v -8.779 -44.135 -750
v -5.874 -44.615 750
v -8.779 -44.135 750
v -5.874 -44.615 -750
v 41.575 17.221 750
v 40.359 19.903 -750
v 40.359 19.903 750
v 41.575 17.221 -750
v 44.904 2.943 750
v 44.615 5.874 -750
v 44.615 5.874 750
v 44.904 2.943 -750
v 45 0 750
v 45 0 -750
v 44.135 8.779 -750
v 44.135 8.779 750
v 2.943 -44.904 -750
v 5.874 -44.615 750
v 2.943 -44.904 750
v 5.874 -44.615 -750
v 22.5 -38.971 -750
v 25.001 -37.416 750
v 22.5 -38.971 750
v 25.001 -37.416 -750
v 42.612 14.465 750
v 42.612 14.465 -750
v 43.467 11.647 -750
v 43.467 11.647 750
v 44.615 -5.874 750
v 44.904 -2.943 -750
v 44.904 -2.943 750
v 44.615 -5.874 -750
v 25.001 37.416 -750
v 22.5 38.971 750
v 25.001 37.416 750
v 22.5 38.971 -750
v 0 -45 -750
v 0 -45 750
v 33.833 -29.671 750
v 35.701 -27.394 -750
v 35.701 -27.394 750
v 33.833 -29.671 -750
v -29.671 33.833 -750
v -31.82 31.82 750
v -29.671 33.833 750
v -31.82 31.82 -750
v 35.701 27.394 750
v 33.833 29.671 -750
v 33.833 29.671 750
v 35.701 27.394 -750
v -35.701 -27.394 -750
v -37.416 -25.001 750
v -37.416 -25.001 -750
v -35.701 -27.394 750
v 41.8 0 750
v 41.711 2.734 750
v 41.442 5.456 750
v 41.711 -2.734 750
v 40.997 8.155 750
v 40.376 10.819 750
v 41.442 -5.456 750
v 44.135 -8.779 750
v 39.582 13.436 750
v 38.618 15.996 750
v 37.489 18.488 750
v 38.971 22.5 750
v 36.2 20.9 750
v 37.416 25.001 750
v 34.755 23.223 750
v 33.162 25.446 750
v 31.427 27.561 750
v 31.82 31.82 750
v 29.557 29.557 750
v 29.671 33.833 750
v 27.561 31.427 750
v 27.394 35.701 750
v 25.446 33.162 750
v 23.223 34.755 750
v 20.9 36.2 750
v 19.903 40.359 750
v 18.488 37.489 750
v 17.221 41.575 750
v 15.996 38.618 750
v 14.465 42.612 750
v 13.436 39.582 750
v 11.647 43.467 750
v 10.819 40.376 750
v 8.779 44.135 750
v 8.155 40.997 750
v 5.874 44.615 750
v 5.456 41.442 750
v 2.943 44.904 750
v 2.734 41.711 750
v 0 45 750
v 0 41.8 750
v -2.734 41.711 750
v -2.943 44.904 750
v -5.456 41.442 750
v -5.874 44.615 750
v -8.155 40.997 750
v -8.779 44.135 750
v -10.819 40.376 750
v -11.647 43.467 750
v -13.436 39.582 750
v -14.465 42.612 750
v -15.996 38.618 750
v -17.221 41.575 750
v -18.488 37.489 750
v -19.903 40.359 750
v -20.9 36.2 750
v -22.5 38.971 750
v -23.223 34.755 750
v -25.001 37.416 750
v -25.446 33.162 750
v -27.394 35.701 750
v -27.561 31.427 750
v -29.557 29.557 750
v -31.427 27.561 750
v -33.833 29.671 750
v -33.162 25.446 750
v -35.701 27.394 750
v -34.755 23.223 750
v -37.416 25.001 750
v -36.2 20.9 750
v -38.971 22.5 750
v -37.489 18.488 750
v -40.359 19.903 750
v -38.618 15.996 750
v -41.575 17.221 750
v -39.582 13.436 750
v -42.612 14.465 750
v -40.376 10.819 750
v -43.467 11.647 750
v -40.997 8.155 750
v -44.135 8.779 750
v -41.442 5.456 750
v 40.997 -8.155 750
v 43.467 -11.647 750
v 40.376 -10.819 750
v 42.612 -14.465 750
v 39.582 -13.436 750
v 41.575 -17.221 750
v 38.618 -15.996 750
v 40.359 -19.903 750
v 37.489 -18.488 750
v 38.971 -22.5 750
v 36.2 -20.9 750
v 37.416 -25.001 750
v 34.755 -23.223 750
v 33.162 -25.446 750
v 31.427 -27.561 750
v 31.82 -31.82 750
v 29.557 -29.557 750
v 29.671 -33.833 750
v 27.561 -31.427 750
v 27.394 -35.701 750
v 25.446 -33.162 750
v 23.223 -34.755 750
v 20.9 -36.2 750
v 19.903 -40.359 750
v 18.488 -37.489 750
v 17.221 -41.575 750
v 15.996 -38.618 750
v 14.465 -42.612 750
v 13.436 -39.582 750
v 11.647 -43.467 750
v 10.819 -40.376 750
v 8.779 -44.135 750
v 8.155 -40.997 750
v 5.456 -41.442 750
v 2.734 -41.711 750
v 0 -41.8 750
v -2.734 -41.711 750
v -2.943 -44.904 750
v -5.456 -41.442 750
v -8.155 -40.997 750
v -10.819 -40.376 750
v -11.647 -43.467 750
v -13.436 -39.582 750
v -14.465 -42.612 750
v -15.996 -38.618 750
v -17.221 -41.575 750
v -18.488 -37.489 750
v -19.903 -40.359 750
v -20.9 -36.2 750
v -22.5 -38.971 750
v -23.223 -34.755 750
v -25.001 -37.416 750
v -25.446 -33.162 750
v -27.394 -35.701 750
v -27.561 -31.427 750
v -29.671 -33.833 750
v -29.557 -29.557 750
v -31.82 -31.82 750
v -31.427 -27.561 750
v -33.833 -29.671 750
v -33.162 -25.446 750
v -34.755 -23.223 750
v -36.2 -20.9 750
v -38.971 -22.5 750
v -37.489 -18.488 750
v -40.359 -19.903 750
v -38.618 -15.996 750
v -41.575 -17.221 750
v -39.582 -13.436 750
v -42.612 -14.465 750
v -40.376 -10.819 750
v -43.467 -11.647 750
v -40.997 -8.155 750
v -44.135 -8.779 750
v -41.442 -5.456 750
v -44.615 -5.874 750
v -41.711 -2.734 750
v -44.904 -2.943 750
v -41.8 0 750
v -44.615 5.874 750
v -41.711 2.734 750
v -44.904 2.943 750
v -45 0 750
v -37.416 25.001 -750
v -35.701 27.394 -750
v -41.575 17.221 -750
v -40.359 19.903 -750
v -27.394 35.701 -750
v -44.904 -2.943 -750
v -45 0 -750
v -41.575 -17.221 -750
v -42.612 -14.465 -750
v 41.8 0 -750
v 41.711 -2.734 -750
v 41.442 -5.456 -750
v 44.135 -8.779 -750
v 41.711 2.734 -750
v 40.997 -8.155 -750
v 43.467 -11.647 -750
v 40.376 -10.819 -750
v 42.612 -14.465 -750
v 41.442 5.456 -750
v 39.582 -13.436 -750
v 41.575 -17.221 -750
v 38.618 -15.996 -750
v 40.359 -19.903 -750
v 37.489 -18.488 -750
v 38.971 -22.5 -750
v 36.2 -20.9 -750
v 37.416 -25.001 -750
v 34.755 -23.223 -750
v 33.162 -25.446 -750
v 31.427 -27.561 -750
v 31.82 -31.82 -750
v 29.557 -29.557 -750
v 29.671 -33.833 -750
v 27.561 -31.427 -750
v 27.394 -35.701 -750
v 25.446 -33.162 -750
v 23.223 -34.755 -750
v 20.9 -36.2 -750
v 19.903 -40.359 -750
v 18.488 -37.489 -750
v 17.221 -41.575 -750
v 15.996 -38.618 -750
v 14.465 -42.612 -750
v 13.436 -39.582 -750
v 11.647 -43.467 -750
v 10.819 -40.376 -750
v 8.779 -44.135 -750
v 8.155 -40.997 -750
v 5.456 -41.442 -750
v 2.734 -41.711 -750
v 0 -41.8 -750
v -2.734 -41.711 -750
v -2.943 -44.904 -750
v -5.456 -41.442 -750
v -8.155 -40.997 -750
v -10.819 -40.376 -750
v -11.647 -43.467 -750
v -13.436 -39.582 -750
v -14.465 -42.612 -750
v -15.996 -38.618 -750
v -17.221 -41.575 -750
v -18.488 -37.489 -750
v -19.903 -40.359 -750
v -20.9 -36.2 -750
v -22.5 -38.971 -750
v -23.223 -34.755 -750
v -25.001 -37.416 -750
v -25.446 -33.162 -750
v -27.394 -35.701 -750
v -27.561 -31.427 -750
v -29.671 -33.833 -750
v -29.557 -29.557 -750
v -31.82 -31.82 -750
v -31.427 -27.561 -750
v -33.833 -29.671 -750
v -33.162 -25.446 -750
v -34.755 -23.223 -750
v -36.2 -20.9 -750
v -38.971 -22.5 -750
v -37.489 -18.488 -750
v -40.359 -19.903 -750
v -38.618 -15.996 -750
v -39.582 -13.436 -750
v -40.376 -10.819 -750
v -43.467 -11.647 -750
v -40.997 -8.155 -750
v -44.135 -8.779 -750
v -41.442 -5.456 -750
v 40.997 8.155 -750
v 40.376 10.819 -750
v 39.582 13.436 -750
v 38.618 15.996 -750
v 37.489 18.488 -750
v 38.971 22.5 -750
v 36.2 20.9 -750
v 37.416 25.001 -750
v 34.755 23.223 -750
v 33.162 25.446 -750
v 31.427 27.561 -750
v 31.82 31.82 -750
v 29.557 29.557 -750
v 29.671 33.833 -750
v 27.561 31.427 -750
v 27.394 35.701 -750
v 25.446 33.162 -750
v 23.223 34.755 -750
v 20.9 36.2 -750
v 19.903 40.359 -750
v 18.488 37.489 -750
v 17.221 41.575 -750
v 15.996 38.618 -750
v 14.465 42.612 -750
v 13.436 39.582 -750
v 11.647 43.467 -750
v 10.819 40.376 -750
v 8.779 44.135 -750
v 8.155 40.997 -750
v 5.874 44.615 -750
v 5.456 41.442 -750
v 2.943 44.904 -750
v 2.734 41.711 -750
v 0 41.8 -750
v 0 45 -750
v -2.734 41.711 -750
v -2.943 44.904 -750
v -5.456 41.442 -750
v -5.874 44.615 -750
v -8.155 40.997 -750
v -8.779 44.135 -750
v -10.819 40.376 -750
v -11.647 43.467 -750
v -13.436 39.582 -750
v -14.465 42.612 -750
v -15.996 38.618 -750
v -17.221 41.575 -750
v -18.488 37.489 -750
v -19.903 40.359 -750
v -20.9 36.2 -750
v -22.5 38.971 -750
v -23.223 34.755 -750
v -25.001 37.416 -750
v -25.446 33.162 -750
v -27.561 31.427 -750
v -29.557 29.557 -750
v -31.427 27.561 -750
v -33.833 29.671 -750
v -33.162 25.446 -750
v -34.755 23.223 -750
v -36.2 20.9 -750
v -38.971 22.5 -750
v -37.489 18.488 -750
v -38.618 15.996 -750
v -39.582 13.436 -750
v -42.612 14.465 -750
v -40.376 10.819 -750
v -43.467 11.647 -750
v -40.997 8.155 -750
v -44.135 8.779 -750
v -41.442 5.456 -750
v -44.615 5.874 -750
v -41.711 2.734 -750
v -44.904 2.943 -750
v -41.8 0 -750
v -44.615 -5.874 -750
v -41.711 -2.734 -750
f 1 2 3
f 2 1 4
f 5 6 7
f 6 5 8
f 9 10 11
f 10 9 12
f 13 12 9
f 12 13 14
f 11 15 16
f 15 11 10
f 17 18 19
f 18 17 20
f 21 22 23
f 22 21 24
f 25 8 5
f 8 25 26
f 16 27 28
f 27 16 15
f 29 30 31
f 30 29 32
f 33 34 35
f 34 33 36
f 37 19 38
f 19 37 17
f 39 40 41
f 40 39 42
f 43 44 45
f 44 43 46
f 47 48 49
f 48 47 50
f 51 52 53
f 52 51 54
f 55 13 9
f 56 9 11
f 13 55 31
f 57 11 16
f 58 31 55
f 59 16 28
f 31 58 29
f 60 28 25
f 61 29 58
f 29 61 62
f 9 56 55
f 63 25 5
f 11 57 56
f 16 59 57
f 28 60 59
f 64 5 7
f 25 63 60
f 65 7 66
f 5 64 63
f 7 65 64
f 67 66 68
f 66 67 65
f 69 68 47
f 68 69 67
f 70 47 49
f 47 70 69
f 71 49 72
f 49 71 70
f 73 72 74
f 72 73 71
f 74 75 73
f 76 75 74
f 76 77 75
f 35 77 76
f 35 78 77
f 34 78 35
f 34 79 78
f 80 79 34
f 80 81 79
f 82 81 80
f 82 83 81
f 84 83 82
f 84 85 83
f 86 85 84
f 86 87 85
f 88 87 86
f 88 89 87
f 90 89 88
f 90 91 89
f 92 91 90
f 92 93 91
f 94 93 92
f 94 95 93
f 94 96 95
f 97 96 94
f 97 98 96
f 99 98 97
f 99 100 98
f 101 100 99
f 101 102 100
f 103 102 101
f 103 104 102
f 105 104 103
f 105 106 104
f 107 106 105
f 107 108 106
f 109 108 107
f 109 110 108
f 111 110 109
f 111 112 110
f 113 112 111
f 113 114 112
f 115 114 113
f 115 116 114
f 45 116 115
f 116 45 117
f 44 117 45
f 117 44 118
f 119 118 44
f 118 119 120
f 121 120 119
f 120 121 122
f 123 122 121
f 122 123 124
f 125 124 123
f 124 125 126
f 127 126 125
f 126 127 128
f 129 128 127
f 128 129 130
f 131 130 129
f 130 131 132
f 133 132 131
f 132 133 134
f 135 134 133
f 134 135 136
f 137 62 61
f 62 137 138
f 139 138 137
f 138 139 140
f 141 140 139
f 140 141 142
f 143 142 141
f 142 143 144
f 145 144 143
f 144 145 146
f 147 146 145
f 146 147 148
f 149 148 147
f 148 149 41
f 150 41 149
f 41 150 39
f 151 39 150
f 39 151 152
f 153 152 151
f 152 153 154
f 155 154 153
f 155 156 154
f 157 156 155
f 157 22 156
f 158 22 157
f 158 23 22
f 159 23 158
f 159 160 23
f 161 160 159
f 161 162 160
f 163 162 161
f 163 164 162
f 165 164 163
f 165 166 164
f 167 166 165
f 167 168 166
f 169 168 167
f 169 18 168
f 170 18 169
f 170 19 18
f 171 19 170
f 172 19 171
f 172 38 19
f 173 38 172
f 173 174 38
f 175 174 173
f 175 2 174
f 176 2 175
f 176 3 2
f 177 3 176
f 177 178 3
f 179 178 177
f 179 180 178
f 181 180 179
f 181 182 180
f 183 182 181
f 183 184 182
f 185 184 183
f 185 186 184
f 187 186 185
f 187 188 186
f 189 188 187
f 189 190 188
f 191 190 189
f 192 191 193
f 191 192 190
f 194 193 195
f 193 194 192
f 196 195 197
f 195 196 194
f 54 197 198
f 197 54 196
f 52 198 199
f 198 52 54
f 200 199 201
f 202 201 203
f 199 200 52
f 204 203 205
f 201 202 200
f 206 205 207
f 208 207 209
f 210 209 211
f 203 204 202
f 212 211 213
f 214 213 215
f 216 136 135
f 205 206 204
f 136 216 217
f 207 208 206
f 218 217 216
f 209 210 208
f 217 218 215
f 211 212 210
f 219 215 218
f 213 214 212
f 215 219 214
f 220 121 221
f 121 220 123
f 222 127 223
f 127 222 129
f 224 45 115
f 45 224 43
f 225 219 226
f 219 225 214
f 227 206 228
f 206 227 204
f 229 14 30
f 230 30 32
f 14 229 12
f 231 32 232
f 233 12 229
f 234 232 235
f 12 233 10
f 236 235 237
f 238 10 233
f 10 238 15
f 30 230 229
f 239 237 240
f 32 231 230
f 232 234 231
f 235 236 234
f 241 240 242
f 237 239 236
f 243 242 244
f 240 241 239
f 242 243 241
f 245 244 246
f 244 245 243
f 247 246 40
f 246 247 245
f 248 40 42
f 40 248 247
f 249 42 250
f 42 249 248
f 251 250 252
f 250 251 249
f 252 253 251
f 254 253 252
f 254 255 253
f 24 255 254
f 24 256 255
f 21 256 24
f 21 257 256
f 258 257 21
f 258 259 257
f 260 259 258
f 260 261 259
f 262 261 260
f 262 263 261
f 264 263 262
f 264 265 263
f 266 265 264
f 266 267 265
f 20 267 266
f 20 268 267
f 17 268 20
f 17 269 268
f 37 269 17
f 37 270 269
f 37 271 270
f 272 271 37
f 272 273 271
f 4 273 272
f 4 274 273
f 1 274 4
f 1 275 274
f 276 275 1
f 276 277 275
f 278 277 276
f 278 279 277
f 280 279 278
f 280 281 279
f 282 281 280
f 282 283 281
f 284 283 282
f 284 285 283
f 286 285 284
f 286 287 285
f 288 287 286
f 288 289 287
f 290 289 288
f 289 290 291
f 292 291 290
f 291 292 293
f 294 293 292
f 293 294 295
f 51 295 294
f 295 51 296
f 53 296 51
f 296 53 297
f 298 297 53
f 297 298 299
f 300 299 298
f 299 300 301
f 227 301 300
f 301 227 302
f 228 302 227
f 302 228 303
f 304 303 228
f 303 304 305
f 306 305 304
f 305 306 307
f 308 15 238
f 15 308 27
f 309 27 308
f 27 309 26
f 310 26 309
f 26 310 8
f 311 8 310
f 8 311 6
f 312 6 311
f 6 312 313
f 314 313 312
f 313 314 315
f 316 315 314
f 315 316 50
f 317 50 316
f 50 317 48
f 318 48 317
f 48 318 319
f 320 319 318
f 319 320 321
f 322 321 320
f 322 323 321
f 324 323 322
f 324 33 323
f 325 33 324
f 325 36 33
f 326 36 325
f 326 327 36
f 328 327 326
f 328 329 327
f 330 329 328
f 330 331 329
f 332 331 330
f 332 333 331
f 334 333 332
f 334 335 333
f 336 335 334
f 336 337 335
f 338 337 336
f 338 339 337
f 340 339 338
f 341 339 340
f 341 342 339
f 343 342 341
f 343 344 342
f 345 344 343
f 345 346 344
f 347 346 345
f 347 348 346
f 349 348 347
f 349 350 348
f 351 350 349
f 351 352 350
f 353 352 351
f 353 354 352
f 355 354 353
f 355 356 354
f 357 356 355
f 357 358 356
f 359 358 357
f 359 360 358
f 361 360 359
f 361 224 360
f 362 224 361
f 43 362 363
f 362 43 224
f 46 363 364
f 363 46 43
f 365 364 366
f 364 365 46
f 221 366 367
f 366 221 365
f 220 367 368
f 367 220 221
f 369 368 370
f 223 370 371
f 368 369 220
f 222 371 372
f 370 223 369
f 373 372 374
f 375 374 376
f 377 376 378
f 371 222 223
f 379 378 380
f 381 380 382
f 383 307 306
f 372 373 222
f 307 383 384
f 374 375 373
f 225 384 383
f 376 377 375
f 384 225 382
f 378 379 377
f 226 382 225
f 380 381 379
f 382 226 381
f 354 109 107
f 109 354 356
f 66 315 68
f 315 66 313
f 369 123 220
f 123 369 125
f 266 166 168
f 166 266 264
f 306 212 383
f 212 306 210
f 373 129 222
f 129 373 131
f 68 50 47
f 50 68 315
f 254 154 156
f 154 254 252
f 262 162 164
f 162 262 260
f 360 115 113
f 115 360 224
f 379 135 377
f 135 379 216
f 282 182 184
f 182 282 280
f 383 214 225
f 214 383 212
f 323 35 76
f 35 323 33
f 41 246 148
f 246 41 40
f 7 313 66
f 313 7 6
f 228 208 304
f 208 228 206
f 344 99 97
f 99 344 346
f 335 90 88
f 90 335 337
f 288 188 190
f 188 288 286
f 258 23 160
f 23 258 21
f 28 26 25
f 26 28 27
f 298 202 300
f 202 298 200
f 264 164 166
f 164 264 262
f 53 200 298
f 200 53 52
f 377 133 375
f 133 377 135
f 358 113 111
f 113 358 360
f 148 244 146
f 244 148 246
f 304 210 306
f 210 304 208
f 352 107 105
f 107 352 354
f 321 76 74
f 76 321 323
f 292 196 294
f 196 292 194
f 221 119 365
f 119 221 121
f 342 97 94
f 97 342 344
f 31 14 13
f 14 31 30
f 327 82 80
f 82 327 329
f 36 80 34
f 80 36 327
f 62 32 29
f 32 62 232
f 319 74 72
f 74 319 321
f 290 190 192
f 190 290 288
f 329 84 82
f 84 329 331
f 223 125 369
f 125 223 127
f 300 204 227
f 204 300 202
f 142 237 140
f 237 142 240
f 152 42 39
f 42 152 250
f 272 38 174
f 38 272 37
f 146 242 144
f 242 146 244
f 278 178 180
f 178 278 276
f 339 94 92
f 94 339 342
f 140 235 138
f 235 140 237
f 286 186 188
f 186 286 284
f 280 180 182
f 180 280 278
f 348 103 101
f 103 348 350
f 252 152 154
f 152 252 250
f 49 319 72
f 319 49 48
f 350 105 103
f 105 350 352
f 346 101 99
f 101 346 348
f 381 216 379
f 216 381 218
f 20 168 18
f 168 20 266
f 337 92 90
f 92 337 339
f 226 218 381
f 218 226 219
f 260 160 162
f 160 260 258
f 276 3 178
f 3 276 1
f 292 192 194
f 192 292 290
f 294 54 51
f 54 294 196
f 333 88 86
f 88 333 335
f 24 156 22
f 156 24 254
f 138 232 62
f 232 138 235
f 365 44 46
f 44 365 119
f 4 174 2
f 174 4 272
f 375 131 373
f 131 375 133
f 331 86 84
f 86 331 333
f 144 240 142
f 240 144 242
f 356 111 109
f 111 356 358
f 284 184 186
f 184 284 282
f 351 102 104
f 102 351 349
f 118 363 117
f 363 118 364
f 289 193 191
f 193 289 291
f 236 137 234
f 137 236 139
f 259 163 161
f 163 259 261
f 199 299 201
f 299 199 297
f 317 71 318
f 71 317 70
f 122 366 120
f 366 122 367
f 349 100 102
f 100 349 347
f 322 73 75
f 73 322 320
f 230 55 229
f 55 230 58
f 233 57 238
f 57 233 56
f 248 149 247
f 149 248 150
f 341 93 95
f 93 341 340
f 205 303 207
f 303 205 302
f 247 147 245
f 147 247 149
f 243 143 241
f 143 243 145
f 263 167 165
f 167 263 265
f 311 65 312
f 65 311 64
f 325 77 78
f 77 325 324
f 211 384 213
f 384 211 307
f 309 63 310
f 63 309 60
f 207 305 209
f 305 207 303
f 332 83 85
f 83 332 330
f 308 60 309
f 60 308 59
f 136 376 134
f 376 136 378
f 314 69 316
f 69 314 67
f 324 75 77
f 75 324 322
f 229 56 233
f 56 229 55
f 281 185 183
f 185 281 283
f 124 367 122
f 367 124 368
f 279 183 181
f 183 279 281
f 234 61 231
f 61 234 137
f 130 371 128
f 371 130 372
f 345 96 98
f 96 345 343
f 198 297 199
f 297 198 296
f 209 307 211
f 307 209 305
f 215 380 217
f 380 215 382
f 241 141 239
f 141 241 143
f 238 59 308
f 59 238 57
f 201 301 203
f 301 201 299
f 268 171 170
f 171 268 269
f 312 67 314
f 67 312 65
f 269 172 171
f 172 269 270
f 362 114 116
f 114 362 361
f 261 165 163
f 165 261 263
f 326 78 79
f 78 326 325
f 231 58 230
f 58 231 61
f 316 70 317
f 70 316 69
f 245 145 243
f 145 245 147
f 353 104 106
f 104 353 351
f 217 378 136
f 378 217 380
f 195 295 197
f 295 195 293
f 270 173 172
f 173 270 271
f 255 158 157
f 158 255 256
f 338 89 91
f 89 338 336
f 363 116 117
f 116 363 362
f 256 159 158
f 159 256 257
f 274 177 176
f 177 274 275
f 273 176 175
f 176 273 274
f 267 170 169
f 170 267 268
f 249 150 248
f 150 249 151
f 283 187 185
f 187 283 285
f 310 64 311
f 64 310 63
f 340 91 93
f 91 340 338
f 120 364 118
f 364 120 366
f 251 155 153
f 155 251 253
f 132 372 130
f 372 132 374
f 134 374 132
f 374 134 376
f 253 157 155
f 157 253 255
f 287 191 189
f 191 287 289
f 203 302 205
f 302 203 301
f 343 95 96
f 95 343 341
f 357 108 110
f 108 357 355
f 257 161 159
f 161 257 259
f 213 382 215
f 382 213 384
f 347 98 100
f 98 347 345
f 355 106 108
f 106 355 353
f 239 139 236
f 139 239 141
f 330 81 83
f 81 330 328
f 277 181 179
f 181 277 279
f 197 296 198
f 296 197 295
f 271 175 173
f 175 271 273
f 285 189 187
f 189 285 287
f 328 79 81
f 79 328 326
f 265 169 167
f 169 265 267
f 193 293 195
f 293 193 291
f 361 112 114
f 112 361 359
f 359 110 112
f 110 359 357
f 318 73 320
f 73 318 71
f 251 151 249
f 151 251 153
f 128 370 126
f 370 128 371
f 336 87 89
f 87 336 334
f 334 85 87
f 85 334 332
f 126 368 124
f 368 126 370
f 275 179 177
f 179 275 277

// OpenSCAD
$fn=96;

module ht_pipe(length=1500, od=90, wall=3.2) {
    difference() {
        cylinder(h=length, d=od, center=true);
        cylinder(h=length+2, d=od-2*wall, center=true);
    }
}

ht_pipe(length=1500, od=90, wall=3.2);
